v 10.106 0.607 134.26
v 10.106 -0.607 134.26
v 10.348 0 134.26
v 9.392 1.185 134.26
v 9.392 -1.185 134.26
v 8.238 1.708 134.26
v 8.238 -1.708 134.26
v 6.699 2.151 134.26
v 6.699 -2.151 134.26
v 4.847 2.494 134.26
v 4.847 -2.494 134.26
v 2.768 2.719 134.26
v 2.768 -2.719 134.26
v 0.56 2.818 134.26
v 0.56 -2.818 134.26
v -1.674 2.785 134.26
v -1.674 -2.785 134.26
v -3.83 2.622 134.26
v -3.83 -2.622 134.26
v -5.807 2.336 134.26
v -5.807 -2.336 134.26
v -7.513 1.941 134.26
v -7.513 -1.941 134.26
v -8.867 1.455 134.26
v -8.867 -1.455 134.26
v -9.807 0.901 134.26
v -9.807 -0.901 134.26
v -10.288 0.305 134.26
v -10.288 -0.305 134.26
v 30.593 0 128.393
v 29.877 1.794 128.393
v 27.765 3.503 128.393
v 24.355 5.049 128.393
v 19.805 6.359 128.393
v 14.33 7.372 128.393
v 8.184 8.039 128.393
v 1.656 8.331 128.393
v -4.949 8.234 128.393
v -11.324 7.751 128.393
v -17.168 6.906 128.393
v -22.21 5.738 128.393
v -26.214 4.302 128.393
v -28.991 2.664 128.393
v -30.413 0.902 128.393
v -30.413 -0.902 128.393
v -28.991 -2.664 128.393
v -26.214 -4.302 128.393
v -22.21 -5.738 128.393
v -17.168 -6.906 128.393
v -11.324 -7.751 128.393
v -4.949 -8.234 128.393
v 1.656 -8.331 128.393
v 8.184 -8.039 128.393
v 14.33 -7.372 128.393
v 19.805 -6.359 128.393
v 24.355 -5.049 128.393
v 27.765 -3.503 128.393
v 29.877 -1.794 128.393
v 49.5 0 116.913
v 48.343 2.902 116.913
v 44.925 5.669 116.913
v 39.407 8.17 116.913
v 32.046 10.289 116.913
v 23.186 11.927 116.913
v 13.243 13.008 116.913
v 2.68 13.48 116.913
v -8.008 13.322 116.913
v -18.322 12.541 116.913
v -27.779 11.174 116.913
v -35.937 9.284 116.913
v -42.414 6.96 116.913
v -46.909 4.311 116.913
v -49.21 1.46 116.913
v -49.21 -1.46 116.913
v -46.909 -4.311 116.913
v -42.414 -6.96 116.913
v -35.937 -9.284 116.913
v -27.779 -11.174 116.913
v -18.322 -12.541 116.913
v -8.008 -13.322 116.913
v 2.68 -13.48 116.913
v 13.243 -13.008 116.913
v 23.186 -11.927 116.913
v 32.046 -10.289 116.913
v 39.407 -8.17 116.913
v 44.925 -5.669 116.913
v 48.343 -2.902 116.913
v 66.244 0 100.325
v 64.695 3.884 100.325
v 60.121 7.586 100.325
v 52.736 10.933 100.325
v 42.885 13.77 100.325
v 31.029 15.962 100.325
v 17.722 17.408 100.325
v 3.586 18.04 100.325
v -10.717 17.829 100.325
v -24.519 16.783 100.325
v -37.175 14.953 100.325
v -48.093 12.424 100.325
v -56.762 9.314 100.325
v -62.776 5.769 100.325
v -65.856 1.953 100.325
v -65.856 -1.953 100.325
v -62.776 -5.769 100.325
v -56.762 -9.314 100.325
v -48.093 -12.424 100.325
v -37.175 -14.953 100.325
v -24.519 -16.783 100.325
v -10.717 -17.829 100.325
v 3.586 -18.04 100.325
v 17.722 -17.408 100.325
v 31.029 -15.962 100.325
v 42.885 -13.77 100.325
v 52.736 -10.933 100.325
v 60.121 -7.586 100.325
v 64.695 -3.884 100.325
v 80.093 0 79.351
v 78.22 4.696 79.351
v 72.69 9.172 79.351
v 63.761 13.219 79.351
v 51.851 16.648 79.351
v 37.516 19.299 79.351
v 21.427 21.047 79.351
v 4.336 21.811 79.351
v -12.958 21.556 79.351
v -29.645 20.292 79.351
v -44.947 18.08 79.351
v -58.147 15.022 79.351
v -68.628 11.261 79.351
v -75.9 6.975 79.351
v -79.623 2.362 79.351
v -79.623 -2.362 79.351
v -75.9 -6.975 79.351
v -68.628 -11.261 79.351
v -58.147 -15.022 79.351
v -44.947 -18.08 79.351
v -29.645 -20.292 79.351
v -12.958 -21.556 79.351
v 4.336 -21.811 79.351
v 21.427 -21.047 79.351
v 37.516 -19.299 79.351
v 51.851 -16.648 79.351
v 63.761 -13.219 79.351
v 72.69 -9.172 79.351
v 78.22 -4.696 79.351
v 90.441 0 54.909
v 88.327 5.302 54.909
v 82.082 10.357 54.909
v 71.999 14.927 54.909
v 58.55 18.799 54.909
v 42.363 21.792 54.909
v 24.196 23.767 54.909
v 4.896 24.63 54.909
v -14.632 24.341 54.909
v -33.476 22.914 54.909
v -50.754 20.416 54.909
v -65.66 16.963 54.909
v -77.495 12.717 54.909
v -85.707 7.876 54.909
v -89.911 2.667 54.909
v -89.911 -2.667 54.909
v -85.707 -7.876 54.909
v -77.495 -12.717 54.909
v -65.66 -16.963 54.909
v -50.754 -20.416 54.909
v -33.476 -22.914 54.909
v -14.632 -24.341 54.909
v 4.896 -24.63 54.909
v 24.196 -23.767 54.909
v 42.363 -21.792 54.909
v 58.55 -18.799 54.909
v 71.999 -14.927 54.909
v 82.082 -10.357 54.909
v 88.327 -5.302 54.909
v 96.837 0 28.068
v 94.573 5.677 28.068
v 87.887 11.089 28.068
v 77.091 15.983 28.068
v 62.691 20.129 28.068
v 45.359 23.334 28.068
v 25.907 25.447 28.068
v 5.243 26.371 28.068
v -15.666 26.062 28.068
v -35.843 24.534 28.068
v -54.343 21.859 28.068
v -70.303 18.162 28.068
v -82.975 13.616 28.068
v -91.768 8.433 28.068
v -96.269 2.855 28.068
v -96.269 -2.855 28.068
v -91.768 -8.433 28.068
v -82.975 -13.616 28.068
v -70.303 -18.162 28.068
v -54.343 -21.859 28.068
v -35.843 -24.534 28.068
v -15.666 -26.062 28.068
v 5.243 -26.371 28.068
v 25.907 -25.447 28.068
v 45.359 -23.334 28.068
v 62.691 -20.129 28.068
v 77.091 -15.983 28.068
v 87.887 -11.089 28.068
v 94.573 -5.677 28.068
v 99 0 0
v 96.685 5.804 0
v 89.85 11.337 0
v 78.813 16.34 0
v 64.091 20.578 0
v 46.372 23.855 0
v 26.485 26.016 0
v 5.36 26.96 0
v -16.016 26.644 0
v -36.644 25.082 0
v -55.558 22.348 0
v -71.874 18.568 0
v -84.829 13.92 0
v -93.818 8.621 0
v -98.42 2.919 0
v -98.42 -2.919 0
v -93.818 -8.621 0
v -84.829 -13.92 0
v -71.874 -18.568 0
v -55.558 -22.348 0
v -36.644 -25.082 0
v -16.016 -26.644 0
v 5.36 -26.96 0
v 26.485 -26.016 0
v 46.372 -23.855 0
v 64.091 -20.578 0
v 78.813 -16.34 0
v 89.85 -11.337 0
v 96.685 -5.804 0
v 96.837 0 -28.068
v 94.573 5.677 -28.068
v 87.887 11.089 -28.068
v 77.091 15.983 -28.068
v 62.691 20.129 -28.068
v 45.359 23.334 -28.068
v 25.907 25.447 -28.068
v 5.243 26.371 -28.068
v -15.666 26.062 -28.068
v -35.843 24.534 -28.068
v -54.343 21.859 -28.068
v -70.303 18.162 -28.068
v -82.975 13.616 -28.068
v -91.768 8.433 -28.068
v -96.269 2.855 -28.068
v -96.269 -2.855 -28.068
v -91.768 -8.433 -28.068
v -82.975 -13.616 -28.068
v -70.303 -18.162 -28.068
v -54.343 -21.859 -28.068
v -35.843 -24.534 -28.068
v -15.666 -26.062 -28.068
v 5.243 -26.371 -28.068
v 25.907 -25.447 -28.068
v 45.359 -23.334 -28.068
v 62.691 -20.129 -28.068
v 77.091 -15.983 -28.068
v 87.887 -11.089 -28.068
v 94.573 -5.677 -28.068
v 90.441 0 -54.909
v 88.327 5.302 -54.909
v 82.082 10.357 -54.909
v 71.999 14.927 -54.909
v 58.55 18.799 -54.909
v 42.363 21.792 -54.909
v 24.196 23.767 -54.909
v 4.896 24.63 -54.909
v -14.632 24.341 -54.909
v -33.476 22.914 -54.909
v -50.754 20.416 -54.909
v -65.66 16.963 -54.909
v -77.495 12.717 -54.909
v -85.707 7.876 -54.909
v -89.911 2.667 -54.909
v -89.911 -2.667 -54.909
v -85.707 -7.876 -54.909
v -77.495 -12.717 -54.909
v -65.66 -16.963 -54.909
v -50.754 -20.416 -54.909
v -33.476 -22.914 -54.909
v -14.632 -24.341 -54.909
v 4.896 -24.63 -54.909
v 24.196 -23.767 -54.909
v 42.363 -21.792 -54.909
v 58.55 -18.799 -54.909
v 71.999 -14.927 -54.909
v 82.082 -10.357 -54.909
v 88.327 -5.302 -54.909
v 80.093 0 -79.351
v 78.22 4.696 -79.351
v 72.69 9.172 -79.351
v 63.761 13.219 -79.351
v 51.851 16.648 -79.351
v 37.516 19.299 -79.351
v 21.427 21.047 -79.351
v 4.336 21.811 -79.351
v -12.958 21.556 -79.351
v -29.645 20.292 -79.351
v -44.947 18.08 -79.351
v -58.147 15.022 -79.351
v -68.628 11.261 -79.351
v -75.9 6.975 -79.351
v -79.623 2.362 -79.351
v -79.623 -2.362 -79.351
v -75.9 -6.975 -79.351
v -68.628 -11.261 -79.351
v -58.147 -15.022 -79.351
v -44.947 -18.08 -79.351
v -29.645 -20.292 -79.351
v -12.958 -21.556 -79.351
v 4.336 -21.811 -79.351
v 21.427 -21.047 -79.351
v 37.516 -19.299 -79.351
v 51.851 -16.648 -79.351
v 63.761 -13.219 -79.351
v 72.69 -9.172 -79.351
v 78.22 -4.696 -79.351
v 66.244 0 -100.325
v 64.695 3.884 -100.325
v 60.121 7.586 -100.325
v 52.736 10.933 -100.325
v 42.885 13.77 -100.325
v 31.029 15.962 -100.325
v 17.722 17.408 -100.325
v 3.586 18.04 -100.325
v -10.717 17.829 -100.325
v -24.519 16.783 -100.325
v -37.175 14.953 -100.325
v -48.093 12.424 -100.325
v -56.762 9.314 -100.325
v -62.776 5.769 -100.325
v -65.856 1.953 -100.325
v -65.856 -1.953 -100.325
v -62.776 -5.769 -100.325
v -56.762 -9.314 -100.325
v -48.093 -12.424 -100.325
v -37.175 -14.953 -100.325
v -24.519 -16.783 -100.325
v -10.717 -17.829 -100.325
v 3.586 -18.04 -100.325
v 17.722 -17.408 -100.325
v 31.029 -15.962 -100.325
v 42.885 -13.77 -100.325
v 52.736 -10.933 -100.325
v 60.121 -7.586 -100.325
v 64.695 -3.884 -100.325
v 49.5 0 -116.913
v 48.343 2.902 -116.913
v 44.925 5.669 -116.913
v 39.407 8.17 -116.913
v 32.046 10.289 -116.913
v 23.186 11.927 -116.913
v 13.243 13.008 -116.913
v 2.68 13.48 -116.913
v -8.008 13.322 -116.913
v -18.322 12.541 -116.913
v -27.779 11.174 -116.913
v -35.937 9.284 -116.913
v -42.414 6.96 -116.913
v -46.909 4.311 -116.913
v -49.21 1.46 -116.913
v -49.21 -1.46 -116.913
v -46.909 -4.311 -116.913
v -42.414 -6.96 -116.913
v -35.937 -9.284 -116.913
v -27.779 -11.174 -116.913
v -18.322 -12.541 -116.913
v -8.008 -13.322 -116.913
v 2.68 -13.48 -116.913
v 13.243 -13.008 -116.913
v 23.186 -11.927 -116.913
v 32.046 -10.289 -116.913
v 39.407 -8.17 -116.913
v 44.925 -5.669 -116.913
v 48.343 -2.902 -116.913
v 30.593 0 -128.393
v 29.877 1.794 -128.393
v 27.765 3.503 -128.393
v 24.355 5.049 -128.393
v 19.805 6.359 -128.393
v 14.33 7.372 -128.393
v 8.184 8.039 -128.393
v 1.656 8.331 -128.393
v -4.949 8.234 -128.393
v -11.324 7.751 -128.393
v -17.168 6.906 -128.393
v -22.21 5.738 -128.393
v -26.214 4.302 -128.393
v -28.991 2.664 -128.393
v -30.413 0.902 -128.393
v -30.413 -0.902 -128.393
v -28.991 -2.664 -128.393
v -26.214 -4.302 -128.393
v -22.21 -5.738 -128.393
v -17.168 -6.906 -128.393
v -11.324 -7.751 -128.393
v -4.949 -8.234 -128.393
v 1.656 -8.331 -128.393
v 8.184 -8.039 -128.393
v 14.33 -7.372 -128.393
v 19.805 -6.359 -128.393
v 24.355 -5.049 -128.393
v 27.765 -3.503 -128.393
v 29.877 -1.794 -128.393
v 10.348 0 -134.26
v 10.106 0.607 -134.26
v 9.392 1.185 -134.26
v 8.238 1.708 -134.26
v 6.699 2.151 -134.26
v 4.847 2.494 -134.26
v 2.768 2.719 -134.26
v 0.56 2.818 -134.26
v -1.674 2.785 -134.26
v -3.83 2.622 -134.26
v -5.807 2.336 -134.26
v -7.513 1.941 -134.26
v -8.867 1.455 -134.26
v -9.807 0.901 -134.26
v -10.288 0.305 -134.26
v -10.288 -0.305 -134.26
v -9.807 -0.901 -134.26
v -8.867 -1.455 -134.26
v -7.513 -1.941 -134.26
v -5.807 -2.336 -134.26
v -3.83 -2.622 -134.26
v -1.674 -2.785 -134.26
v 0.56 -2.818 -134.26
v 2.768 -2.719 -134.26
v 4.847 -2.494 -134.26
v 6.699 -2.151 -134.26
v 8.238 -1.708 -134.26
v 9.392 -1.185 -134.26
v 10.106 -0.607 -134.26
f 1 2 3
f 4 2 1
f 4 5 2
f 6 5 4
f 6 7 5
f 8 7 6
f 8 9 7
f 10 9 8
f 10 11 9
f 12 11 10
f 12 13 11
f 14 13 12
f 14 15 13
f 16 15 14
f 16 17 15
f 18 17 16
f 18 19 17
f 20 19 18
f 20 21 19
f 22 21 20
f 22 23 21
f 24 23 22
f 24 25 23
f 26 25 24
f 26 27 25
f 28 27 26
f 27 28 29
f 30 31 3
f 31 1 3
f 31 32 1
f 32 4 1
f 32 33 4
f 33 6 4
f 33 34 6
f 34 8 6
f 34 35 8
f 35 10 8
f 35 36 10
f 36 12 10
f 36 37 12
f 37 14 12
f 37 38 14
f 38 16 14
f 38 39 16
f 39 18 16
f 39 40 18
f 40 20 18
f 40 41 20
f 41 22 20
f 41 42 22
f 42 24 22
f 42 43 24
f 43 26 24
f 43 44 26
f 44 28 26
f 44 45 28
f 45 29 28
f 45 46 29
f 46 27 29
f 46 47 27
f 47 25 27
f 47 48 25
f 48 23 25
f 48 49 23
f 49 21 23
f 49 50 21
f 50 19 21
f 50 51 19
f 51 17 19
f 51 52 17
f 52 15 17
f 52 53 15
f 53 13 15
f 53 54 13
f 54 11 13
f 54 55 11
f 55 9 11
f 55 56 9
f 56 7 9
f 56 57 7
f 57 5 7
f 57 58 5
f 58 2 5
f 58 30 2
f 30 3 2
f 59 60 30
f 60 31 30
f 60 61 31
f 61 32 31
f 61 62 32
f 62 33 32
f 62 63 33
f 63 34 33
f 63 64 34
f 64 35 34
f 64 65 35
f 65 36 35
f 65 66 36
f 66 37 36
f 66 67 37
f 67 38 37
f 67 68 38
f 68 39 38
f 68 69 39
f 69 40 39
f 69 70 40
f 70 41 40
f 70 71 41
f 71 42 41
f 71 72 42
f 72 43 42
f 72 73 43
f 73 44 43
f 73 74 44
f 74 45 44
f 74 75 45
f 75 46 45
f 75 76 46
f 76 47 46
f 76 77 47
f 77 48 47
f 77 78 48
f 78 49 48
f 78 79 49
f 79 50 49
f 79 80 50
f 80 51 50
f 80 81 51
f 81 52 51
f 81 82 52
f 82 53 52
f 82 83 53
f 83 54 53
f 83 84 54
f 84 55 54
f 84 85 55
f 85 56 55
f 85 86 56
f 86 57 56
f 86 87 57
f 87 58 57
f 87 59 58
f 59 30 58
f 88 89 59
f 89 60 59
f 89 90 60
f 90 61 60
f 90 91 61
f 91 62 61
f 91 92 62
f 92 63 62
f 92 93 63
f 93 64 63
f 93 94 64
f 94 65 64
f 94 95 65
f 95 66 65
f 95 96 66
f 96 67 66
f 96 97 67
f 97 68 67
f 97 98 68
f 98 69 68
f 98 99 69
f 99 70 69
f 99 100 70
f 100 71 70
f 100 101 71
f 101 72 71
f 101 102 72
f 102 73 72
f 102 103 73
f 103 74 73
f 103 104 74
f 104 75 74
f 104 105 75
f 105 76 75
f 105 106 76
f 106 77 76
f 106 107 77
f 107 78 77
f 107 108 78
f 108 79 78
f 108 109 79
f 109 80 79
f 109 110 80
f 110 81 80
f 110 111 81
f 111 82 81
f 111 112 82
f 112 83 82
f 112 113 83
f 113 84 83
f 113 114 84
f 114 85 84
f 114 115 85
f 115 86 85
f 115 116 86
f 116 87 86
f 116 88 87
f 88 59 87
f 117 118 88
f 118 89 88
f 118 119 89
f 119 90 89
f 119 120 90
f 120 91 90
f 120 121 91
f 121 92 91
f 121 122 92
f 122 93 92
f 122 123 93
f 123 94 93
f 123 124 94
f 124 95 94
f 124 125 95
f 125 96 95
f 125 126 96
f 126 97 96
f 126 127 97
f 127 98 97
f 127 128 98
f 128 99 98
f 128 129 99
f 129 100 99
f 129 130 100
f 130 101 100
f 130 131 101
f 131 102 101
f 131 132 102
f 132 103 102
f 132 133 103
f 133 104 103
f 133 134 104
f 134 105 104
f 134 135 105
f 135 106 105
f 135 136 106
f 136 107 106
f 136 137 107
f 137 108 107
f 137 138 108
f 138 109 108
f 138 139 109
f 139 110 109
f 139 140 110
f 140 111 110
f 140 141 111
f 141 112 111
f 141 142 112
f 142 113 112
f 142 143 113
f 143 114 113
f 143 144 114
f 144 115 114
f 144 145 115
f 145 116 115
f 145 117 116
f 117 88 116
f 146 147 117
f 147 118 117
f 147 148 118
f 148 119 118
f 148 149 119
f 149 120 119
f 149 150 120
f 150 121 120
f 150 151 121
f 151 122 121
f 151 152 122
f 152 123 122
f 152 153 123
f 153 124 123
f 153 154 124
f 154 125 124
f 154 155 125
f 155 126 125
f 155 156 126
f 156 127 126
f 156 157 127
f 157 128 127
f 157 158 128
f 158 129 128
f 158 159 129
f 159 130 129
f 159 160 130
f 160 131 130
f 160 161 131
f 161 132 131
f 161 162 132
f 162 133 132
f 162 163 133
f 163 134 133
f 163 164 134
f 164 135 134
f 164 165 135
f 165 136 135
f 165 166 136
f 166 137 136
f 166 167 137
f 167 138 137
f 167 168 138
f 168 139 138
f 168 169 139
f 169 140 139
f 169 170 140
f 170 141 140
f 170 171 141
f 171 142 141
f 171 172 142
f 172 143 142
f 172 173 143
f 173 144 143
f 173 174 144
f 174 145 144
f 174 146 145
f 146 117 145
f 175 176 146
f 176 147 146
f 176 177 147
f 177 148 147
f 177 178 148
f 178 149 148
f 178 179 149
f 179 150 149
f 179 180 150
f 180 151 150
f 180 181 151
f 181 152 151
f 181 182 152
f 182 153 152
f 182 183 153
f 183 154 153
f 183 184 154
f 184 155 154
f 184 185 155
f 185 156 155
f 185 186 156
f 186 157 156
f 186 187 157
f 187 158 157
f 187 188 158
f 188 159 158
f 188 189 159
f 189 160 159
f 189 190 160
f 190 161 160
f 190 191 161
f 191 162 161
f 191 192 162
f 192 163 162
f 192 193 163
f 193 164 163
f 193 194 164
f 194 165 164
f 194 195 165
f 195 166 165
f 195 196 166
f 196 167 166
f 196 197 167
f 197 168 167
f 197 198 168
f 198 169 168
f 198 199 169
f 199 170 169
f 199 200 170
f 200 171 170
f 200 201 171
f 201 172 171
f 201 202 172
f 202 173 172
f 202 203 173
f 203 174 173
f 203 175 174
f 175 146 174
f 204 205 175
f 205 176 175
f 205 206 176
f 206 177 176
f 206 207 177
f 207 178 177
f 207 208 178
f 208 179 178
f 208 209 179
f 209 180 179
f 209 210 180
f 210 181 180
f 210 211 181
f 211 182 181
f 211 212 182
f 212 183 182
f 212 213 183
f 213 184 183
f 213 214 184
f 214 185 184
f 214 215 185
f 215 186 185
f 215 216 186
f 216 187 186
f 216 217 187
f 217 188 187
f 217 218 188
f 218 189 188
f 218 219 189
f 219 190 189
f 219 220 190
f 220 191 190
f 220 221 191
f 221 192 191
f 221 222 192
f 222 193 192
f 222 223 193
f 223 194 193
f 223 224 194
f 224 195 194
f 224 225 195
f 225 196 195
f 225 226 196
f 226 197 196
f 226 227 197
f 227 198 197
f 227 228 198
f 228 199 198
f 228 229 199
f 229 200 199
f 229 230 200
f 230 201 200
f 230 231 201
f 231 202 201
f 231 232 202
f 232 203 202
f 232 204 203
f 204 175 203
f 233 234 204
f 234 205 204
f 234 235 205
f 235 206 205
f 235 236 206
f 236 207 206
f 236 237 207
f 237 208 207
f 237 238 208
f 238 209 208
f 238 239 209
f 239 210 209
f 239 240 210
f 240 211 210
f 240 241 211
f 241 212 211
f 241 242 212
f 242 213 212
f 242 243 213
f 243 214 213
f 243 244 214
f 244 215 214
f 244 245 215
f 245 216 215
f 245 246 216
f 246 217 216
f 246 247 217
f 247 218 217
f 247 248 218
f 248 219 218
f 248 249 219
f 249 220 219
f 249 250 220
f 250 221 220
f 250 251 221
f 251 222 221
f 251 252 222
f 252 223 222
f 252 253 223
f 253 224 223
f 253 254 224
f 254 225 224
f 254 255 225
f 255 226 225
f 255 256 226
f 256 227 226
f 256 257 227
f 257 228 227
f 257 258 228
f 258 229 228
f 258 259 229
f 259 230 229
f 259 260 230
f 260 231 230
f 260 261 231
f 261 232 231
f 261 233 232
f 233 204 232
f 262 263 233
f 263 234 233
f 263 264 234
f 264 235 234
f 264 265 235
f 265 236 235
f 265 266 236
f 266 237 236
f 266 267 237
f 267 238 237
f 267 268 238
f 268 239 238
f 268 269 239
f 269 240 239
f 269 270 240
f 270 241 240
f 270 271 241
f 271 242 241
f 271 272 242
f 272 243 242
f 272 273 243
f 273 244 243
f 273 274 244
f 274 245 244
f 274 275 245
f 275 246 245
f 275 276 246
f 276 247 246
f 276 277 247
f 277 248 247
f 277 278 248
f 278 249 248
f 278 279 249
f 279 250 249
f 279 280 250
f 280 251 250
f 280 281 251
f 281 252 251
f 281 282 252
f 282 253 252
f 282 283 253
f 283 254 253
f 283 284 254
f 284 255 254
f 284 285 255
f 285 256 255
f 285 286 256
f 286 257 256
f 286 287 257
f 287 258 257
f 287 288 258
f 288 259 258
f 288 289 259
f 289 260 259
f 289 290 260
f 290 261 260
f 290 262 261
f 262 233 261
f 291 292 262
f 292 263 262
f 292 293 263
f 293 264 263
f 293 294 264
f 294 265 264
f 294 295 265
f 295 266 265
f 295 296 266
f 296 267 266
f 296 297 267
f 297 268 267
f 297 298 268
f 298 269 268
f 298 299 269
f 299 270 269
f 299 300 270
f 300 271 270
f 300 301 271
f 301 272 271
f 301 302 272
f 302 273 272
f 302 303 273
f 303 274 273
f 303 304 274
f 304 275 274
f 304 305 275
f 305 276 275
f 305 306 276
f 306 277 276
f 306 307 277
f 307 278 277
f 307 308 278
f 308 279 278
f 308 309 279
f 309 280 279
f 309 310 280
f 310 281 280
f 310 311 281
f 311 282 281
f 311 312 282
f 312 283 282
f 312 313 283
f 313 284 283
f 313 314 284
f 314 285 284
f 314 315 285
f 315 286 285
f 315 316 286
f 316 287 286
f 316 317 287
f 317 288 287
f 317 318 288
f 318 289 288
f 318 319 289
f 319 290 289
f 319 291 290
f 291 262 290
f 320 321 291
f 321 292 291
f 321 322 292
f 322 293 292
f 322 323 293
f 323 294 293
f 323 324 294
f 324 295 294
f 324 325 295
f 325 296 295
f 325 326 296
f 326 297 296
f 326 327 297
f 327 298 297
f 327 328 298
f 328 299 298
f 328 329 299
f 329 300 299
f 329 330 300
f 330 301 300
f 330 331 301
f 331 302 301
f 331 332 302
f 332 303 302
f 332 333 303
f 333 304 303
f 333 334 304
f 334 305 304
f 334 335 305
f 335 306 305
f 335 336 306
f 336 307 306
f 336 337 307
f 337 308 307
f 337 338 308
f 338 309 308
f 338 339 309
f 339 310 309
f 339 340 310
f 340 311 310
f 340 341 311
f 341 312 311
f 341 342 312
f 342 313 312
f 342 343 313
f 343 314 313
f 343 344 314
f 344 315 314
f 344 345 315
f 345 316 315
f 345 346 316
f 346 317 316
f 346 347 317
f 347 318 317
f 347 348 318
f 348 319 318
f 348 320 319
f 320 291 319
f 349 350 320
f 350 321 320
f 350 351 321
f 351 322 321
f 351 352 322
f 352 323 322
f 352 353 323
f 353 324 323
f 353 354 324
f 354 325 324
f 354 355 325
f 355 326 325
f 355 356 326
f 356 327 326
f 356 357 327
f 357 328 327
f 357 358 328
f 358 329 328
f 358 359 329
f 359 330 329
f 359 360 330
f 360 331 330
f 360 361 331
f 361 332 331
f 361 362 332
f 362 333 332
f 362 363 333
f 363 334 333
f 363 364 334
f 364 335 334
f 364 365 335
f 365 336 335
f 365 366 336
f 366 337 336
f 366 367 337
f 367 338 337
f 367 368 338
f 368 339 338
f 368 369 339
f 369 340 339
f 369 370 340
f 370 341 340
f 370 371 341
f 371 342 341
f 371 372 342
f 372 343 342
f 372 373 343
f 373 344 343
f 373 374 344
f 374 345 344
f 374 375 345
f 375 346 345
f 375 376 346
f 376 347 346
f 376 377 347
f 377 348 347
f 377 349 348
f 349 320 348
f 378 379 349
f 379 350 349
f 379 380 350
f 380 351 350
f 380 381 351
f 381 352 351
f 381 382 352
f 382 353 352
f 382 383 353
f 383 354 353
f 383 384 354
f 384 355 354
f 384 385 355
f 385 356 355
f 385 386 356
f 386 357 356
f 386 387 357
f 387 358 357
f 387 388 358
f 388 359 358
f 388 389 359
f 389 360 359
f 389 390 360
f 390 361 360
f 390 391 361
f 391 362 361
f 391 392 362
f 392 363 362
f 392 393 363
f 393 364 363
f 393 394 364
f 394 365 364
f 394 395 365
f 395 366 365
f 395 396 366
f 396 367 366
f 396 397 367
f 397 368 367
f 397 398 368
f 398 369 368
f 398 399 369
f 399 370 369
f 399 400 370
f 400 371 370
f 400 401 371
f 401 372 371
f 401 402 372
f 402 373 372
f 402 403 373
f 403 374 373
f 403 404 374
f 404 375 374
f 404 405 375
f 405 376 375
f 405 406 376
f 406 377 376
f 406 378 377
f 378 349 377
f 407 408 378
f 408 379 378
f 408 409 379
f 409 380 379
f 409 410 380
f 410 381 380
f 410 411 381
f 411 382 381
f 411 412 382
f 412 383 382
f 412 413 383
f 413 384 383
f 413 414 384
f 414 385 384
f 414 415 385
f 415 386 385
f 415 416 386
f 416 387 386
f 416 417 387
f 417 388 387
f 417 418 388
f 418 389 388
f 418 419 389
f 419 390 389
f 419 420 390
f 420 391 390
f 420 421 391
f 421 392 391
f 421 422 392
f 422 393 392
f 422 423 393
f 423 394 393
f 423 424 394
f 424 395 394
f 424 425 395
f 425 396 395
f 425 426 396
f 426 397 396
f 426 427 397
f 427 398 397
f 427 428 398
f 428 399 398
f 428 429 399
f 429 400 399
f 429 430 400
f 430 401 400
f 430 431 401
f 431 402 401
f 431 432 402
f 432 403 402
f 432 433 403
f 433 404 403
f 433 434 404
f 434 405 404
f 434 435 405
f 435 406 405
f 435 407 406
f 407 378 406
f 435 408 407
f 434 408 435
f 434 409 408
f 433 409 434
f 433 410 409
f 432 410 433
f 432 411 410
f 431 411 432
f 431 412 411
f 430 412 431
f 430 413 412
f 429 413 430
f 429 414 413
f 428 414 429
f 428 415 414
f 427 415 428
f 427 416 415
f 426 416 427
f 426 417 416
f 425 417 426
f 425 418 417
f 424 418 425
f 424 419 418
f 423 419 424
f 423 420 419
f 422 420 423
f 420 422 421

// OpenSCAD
// Generated by SolidPython 1.0.1 on 2020-07-29 00:46:49


scale(v = [11, 3, 15]) {
	sphere(r = 9);
}
/***********************************************
*********      SolidPython code:      **********
************************************************
 
# import packages: SolidPython
from solid import *
from solid.utils import *
from itertools import chain, combinations, permutations


class Resize:

    def __init__(self, scad_file):
        self.scad_file = scad_file
        #self.scad_file = import_scad(scad_file)
        # cone/cylinder param:
        self.r1 = 0
        self.r2 = 0
        self.h = 0
        # rectangular prism param:
        self.w = 0
        self.l = 0
        # ellipse param:
        self.r = 0

    # import OpenScad code (file name corresponds to shape)


    # classify shape + parameters
    def assign(self, param1, param2, param3):
        if self.scad_file == 'cone.scad':
            self.r1 = param1
            self.r2 = param2
            self.h = param3
        elif self.scad_file == 'cylinder.scad':
            self.r1 = param1
            self.r2 = param2
            self.h = param3
        elif self.scad_file == 'rectangularPrism.scad':
            self.h = param1
            self.l = param2
            self.w = param3
        else:
            self.r = param1
            self.h = param2

    # resize parameters
    def iterate(self):
        x = range(3, 20, 2)
        i = 1
        if self.scad_file == 'cone.scad':
            tempList = list(permutations(x, 2))
            for temp in tempList:
                param1 = temp[0]
                param2 = temp[1]
                filepath = 'produced_scad_files/' + 'cone' + str(param1) + '_' + str(param2) + '_' + '.scad'
                scad_render_to_file(cylinder(h=param1, r1=param2, r2=0), filepath)

        elif self.scad_file == 'cylinder.scad':
            tempList = list(permutations(x, 3))
            for temp in tempList:
                param1 = temp[0]
                param2 = temp[1]
                filepath = 'produced_scad_files/' + 'cylinder' + str(param1) + '_' + str(param2) + '_' + '.scad'
                scad_render_to_file(cylinder(h=param1, r1=param2, r2=param2), filepath)

        elif self.scad_file == 'rectangularPrism.scad':
            tempList = list(permutations(x, 3))
            for temp in tempList:
                param1 = temp[0]
                param2 = temp[1]
                param3 = temp[2]
                filepath = 'produced_scad_files/' + 'rectangularPrism' + str(param1) + '_' + str(param2) + '_' + str(
                    param3) + '.scad'
                scad_render_to_file(cube(size=(param1, param2, param3)), filepath)

        elif self.scad_file == 'ellipse.scad':
            tempList = list(permutations(x, 4))
            for temp in tempList:
                param1 = temp[0]
                param2 = temp[1]
                param3 = temp[2]
                param4 = temp[3]
                filepath = 'produced_scad_files/' + 'ellipse' + str(param1) + '_' + str(param2) + '_' + str(param3) + '_' + str(param4) + '.scad'
                scad_render_to_file(scale([param1, param2, param3])(sphere(r=param4)), filepath)

    def render_to_scadfile(self):
        scad_render_to_file(scad, 'example.scad') 
 
************************************************/
